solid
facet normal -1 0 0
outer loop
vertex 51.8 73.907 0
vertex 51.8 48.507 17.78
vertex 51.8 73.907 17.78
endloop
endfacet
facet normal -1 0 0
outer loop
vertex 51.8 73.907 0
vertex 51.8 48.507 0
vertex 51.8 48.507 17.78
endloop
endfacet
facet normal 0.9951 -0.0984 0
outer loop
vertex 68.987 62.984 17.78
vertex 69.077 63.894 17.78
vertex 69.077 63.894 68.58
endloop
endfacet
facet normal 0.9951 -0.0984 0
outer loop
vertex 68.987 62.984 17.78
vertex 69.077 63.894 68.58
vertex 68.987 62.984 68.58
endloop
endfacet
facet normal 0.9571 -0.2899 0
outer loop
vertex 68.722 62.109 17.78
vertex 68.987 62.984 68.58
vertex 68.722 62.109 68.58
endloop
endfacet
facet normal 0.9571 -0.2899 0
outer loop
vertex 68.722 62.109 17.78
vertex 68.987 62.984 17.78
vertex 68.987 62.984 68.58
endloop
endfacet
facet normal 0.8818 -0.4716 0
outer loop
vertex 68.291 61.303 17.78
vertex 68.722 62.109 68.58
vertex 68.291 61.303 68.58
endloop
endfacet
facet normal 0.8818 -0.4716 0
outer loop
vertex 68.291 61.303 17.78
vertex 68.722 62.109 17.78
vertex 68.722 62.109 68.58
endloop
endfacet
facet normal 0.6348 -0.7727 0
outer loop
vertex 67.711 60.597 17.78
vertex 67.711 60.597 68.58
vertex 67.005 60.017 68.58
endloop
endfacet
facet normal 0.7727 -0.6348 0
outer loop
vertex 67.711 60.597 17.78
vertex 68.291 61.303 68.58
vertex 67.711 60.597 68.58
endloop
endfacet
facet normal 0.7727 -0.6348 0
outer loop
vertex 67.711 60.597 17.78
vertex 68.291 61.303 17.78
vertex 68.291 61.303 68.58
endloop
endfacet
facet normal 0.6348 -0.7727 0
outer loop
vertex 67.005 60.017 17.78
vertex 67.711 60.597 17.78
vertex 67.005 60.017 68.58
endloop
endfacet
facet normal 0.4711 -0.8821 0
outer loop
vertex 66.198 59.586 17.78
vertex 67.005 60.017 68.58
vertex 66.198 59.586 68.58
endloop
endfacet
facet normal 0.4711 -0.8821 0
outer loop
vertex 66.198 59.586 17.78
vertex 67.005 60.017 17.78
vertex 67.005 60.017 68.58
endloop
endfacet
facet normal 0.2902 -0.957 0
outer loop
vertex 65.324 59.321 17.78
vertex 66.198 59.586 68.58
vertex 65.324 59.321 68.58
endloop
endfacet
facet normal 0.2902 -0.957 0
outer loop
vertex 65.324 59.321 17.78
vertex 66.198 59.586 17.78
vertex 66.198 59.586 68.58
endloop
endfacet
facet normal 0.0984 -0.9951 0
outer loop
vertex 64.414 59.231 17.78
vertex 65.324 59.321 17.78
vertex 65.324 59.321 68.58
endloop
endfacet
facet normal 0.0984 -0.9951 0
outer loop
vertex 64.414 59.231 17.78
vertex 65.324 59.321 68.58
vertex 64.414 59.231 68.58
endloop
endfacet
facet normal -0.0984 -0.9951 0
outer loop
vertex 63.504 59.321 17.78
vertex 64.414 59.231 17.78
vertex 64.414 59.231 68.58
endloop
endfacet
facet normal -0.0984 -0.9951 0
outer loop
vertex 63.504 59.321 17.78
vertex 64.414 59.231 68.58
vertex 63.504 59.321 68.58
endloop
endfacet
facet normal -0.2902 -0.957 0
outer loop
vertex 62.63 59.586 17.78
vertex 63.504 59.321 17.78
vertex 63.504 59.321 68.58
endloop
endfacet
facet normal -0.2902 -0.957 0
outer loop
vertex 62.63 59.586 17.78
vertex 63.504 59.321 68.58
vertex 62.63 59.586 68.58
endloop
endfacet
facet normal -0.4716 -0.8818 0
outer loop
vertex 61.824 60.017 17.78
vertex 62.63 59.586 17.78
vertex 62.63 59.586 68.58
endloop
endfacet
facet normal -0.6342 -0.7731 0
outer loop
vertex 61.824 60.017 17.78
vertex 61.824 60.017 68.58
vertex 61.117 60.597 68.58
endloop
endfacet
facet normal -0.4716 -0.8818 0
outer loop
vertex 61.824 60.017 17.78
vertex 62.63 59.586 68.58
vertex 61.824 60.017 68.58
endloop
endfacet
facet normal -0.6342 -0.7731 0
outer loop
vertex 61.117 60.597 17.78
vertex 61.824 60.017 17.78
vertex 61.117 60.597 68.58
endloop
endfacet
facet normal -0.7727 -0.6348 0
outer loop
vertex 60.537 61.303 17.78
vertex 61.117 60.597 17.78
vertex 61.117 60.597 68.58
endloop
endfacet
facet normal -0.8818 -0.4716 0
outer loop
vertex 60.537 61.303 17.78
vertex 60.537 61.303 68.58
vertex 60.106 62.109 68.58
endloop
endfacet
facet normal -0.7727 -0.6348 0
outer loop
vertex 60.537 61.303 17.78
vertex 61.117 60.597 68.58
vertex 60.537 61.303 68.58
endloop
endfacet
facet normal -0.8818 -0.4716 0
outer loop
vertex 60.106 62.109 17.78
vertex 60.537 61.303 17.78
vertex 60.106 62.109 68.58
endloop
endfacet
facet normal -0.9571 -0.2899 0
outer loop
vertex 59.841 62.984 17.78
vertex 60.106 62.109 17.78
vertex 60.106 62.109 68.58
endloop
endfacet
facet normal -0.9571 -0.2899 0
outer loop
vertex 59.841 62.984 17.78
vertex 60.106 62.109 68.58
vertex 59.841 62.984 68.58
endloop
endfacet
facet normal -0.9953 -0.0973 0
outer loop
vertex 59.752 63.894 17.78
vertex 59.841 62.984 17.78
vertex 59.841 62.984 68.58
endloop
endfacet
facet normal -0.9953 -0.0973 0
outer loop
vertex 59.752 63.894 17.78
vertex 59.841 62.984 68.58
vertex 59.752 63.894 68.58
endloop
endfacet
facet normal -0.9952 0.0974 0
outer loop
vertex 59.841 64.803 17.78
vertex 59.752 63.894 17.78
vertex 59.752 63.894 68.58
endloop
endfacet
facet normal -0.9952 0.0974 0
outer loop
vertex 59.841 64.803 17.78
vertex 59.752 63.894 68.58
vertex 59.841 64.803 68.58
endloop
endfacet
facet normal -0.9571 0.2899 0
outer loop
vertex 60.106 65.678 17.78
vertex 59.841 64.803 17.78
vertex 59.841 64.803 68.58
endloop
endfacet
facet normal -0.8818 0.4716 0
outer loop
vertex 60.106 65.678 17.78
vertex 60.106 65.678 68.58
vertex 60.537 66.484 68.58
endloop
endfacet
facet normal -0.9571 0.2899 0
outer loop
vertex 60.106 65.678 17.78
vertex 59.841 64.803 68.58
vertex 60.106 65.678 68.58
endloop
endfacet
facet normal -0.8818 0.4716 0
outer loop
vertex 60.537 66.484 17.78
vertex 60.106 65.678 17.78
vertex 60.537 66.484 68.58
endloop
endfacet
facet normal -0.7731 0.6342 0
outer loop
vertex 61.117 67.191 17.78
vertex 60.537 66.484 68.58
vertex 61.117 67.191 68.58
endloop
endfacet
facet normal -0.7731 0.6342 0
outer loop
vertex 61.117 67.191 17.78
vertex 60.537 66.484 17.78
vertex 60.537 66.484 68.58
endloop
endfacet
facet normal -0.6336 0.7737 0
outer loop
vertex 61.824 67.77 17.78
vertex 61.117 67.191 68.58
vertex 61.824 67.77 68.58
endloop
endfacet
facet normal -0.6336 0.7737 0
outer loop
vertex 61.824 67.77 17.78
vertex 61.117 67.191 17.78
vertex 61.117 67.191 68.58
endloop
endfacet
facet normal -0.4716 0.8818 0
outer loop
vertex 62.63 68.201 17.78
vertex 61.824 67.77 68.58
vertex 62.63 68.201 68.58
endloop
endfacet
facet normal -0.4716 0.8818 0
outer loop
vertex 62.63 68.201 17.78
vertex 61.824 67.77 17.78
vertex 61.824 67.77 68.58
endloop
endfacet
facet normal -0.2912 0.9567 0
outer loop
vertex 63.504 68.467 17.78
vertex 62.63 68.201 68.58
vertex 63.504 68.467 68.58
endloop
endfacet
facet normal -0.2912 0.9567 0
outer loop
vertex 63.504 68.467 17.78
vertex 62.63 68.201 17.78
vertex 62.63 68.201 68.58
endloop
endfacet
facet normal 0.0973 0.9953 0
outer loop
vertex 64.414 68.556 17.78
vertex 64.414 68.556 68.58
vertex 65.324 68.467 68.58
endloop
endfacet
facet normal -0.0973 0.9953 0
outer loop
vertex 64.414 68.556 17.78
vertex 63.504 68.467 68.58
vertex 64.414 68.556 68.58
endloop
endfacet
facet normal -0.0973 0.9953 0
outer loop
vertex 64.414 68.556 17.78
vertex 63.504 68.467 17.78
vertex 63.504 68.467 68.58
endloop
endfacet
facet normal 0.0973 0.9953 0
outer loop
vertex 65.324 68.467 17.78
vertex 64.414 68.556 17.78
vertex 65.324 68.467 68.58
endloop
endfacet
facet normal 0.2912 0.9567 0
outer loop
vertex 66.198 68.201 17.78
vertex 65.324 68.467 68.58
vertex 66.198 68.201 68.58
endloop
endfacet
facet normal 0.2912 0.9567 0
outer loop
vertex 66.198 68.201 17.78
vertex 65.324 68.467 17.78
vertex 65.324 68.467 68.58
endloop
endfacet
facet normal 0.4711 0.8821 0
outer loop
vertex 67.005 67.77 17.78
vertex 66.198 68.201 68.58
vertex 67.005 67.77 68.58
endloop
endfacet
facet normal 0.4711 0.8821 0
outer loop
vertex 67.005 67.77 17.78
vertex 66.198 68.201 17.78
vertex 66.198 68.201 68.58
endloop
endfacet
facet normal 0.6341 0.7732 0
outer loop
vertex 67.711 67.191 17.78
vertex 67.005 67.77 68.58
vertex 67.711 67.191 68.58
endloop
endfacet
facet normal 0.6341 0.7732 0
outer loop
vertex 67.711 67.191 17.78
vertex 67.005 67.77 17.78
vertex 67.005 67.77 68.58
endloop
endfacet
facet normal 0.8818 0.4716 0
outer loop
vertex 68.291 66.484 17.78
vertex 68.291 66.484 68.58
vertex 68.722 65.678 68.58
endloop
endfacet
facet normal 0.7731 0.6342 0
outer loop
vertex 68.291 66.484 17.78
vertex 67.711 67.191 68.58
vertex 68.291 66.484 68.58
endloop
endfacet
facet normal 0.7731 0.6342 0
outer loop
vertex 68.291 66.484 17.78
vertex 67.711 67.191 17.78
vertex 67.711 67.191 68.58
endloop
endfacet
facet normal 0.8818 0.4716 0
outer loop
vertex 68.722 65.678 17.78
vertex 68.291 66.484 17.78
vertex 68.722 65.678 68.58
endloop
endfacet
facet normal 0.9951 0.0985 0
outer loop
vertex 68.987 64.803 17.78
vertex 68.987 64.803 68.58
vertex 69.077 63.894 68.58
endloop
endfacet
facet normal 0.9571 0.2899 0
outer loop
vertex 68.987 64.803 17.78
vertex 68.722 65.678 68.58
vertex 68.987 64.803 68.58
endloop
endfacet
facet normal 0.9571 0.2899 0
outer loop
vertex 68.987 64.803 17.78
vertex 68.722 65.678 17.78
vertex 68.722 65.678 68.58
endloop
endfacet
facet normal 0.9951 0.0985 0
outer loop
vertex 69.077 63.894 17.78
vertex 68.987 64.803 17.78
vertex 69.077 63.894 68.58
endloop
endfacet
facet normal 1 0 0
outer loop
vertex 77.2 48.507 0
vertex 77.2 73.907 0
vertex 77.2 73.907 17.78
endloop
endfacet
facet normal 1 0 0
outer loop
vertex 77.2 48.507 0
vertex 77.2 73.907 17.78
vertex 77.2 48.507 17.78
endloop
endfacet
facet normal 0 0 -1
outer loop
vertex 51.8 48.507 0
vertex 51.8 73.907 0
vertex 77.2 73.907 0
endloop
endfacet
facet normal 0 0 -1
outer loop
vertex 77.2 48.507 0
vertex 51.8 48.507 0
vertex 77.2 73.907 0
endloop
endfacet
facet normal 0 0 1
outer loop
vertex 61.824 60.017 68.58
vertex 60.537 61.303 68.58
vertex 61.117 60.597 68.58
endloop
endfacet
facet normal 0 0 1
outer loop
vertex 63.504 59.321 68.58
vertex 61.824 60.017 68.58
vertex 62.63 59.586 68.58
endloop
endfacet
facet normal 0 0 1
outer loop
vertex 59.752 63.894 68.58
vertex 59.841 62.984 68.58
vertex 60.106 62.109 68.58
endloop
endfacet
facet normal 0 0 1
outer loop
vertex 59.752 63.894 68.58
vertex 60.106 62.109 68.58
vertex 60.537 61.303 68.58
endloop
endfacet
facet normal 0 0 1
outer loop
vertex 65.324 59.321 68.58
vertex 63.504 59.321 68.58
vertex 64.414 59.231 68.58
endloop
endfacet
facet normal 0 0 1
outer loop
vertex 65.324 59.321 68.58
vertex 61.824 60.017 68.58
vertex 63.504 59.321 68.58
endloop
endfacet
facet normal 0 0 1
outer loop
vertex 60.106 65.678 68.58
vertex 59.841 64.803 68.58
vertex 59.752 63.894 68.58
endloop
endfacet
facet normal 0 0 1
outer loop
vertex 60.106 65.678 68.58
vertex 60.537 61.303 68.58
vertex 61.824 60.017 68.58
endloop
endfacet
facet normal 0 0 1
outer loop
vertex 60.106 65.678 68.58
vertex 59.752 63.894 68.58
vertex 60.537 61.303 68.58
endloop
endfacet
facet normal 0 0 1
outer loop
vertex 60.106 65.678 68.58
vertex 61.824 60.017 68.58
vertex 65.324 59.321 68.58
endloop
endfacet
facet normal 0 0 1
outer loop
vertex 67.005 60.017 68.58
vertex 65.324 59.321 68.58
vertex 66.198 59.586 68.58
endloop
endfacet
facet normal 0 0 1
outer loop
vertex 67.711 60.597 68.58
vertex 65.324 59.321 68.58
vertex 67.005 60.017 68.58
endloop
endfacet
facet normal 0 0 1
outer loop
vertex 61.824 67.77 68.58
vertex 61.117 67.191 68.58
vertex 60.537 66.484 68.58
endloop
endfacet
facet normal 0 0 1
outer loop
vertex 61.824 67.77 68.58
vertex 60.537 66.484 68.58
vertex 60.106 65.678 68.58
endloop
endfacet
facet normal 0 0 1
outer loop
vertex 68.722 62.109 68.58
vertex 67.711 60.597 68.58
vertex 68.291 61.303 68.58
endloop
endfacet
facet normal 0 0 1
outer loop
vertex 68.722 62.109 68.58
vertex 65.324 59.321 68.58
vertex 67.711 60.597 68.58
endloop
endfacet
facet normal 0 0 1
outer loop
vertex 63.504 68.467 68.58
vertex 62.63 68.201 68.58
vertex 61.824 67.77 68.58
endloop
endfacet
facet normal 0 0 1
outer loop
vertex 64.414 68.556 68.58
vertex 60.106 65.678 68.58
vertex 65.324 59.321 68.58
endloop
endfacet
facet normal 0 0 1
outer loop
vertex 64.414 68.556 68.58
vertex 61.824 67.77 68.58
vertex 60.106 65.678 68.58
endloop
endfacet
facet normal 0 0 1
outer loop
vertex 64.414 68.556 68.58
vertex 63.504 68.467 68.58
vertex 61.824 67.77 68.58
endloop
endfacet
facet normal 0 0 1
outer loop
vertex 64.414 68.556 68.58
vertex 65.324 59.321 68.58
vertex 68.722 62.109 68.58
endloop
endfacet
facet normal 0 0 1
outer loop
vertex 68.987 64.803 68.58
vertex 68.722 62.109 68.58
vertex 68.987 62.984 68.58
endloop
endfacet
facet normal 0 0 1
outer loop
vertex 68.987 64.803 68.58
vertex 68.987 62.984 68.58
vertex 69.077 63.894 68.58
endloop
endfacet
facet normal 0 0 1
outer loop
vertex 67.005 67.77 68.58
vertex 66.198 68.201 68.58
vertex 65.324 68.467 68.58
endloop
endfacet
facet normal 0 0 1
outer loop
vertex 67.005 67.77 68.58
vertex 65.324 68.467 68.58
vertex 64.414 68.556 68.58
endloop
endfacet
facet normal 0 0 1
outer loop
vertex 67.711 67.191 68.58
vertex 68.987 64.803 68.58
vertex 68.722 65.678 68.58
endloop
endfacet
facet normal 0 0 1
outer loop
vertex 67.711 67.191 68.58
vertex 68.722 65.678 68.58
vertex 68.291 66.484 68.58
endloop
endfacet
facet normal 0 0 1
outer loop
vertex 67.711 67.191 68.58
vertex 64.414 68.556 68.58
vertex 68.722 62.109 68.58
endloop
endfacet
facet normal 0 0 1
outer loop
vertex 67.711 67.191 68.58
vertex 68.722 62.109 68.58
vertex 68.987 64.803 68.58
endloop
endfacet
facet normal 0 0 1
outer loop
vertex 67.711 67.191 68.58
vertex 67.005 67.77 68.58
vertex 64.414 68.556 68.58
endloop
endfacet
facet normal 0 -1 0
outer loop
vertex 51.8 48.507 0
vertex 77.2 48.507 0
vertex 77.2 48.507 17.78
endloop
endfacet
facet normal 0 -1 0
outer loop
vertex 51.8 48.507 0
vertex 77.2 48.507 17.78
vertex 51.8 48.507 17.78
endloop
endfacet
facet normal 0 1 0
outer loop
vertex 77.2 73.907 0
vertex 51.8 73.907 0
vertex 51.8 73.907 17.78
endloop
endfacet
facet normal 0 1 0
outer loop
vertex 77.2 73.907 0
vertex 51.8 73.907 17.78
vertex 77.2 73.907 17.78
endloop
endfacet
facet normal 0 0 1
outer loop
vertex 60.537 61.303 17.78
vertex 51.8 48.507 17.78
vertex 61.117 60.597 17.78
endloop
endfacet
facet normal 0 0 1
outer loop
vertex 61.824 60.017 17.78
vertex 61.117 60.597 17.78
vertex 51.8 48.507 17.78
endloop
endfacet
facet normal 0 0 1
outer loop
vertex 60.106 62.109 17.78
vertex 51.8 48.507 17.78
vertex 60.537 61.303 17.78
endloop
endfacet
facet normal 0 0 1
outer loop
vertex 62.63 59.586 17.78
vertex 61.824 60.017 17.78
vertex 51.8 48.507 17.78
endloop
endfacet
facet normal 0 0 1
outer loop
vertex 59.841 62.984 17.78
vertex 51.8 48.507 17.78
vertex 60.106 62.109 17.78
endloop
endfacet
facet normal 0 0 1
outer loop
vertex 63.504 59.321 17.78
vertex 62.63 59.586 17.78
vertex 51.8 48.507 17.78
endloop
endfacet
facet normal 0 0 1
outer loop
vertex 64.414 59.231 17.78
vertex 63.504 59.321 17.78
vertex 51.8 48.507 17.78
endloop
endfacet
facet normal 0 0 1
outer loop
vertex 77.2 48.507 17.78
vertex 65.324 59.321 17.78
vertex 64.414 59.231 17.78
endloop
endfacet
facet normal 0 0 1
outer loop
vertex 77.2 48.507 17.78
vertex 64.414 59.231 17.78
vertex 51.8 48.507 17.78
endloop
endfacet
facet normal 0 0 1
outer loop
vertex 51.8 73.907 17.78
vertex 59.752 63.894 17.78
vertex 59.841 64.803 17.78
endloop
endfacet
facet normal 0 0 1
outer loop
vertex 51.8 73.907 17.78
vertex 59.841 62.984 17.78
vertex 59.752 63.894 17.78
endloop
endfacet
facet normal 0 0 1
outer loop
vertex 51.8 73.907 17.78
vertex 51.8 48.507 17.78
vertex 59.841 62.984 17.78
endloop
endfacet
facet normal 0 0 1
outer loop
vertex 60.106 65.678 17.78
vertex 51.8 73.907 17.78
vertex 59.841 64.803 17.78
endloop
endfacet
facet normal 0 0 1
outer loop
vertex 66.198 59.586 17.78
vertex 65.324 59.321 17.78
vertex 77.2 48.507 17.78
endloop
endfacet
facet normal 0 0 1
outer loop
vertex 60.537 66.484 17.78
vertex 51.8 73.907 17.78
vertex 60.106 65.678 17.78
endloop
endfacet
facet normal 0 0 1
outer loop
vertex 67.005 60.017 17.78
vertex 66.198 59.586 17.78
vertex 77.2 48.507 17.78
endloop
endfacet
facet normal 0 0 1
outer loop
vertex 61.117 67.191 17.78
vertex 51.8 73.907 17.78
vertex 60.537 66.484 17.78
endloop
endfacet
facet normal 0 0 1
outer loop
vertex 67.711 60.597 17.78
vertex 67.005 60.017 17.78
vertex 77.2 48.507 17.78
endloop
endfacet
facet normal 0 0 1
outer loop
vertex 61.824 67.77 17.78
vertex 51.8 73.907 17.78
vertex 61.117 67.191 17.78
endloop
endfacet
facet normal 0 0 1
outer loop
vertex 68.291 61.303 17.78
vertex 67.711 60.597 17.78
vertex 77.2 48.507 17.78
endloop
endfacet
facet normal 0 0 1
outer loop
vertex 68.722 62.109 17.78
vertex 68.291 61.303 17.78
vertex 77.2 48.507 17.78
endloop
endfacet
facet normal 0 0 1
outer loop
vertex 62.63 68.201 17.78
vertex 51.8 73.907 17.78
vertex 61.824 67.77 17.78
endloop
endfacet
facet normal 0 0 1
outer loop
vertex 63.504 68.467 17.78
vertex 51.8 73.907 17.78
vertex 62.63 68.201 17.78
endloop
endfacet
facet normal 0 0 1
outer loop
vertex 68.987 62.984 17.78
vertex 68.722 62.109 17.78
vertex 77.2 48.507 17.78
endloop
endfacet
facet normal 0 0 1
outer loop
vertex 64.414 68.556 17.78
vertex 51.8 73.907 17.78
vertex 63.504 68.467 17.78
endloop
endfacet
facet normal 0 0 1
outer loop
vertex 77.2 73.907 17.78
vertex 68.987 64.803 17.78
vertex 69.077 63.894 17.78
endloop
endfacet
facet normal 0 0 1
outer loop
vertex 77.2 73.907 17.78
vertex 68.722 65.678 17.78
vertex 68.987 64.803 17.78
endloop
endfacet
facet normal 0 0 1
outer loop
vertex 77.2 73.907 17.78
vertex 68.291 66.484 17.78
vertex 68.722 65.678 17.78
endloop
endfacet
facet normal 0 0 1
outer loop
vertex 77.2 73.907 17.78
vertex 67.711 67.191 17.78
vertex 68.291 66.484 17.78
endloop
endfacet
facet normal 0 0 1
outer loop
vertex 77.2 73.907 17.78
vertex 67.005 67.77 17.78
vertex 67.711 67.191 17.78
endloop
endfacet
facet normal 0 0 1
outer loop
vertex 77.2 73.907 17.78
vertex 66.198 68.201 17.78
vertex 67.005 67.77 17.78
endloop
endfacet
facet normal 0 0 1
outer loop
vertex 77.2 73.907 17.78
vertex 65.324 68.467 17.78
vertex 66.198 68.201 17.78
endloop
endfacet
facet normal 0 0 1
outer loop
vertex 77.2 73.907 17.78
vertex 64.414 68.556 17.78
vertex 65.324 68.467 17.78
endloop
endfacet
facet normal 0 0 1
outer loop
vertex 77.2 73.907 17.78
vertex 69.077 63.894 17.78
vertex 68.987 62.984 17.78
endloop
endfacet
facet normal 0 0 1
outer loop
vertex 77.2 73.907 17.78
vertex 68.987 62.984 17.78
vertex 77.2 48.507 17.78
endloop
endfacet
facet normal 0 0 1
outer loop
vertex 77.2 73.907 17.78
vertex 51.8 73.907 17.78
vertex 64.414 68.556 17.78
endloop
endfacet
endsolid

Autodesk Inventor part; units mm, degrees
ref_plane "YZ Plane" through (0, 0, 0) normal (1, 0, 0) x (0, 1, 0)
ref_plane "XZ Plane" through (0, 0, 0) normal (0, 1, 0) x (-1, 0, 0)
ref_plane "XY Plane" through (0, 0, 0) normal (0, 0, 1) x (1, 0, 0)
sketch "Sketch3" plane through (0, 0, 0) normal (0, 0, 1) x (1, 0, 0)
  line L0 (51.7998, 73.9071) -> (77.1998, 73.9071)
  line L1 (77.1998, 73.9071) -> (77.1998, 48.5071)
  line L2 (77.1998, 48.5071) -> (51.7998, 48.5071)
  line L3 (51.7998, 48.5071) -> (51.7998, 73.9071)
  point P0 (0, 0)
  dimension "d2" = 25.4
  dimension "d3" = 25.4
extrude "Extrusion2" add sketch "Sketch3" along normal blind 17.78
sketch "Sketch4" plane through (0, 0, 17.78) normal (0, 0, 1) x (1, 0, 0)
  circle A0 centre (64.4141, 63.8936) radius 4.6626
  point P0 (0, 0)
extrude "Extrusion3" add sketch "Sketch4" along normal blind 50.8
properties part number "galvo"
